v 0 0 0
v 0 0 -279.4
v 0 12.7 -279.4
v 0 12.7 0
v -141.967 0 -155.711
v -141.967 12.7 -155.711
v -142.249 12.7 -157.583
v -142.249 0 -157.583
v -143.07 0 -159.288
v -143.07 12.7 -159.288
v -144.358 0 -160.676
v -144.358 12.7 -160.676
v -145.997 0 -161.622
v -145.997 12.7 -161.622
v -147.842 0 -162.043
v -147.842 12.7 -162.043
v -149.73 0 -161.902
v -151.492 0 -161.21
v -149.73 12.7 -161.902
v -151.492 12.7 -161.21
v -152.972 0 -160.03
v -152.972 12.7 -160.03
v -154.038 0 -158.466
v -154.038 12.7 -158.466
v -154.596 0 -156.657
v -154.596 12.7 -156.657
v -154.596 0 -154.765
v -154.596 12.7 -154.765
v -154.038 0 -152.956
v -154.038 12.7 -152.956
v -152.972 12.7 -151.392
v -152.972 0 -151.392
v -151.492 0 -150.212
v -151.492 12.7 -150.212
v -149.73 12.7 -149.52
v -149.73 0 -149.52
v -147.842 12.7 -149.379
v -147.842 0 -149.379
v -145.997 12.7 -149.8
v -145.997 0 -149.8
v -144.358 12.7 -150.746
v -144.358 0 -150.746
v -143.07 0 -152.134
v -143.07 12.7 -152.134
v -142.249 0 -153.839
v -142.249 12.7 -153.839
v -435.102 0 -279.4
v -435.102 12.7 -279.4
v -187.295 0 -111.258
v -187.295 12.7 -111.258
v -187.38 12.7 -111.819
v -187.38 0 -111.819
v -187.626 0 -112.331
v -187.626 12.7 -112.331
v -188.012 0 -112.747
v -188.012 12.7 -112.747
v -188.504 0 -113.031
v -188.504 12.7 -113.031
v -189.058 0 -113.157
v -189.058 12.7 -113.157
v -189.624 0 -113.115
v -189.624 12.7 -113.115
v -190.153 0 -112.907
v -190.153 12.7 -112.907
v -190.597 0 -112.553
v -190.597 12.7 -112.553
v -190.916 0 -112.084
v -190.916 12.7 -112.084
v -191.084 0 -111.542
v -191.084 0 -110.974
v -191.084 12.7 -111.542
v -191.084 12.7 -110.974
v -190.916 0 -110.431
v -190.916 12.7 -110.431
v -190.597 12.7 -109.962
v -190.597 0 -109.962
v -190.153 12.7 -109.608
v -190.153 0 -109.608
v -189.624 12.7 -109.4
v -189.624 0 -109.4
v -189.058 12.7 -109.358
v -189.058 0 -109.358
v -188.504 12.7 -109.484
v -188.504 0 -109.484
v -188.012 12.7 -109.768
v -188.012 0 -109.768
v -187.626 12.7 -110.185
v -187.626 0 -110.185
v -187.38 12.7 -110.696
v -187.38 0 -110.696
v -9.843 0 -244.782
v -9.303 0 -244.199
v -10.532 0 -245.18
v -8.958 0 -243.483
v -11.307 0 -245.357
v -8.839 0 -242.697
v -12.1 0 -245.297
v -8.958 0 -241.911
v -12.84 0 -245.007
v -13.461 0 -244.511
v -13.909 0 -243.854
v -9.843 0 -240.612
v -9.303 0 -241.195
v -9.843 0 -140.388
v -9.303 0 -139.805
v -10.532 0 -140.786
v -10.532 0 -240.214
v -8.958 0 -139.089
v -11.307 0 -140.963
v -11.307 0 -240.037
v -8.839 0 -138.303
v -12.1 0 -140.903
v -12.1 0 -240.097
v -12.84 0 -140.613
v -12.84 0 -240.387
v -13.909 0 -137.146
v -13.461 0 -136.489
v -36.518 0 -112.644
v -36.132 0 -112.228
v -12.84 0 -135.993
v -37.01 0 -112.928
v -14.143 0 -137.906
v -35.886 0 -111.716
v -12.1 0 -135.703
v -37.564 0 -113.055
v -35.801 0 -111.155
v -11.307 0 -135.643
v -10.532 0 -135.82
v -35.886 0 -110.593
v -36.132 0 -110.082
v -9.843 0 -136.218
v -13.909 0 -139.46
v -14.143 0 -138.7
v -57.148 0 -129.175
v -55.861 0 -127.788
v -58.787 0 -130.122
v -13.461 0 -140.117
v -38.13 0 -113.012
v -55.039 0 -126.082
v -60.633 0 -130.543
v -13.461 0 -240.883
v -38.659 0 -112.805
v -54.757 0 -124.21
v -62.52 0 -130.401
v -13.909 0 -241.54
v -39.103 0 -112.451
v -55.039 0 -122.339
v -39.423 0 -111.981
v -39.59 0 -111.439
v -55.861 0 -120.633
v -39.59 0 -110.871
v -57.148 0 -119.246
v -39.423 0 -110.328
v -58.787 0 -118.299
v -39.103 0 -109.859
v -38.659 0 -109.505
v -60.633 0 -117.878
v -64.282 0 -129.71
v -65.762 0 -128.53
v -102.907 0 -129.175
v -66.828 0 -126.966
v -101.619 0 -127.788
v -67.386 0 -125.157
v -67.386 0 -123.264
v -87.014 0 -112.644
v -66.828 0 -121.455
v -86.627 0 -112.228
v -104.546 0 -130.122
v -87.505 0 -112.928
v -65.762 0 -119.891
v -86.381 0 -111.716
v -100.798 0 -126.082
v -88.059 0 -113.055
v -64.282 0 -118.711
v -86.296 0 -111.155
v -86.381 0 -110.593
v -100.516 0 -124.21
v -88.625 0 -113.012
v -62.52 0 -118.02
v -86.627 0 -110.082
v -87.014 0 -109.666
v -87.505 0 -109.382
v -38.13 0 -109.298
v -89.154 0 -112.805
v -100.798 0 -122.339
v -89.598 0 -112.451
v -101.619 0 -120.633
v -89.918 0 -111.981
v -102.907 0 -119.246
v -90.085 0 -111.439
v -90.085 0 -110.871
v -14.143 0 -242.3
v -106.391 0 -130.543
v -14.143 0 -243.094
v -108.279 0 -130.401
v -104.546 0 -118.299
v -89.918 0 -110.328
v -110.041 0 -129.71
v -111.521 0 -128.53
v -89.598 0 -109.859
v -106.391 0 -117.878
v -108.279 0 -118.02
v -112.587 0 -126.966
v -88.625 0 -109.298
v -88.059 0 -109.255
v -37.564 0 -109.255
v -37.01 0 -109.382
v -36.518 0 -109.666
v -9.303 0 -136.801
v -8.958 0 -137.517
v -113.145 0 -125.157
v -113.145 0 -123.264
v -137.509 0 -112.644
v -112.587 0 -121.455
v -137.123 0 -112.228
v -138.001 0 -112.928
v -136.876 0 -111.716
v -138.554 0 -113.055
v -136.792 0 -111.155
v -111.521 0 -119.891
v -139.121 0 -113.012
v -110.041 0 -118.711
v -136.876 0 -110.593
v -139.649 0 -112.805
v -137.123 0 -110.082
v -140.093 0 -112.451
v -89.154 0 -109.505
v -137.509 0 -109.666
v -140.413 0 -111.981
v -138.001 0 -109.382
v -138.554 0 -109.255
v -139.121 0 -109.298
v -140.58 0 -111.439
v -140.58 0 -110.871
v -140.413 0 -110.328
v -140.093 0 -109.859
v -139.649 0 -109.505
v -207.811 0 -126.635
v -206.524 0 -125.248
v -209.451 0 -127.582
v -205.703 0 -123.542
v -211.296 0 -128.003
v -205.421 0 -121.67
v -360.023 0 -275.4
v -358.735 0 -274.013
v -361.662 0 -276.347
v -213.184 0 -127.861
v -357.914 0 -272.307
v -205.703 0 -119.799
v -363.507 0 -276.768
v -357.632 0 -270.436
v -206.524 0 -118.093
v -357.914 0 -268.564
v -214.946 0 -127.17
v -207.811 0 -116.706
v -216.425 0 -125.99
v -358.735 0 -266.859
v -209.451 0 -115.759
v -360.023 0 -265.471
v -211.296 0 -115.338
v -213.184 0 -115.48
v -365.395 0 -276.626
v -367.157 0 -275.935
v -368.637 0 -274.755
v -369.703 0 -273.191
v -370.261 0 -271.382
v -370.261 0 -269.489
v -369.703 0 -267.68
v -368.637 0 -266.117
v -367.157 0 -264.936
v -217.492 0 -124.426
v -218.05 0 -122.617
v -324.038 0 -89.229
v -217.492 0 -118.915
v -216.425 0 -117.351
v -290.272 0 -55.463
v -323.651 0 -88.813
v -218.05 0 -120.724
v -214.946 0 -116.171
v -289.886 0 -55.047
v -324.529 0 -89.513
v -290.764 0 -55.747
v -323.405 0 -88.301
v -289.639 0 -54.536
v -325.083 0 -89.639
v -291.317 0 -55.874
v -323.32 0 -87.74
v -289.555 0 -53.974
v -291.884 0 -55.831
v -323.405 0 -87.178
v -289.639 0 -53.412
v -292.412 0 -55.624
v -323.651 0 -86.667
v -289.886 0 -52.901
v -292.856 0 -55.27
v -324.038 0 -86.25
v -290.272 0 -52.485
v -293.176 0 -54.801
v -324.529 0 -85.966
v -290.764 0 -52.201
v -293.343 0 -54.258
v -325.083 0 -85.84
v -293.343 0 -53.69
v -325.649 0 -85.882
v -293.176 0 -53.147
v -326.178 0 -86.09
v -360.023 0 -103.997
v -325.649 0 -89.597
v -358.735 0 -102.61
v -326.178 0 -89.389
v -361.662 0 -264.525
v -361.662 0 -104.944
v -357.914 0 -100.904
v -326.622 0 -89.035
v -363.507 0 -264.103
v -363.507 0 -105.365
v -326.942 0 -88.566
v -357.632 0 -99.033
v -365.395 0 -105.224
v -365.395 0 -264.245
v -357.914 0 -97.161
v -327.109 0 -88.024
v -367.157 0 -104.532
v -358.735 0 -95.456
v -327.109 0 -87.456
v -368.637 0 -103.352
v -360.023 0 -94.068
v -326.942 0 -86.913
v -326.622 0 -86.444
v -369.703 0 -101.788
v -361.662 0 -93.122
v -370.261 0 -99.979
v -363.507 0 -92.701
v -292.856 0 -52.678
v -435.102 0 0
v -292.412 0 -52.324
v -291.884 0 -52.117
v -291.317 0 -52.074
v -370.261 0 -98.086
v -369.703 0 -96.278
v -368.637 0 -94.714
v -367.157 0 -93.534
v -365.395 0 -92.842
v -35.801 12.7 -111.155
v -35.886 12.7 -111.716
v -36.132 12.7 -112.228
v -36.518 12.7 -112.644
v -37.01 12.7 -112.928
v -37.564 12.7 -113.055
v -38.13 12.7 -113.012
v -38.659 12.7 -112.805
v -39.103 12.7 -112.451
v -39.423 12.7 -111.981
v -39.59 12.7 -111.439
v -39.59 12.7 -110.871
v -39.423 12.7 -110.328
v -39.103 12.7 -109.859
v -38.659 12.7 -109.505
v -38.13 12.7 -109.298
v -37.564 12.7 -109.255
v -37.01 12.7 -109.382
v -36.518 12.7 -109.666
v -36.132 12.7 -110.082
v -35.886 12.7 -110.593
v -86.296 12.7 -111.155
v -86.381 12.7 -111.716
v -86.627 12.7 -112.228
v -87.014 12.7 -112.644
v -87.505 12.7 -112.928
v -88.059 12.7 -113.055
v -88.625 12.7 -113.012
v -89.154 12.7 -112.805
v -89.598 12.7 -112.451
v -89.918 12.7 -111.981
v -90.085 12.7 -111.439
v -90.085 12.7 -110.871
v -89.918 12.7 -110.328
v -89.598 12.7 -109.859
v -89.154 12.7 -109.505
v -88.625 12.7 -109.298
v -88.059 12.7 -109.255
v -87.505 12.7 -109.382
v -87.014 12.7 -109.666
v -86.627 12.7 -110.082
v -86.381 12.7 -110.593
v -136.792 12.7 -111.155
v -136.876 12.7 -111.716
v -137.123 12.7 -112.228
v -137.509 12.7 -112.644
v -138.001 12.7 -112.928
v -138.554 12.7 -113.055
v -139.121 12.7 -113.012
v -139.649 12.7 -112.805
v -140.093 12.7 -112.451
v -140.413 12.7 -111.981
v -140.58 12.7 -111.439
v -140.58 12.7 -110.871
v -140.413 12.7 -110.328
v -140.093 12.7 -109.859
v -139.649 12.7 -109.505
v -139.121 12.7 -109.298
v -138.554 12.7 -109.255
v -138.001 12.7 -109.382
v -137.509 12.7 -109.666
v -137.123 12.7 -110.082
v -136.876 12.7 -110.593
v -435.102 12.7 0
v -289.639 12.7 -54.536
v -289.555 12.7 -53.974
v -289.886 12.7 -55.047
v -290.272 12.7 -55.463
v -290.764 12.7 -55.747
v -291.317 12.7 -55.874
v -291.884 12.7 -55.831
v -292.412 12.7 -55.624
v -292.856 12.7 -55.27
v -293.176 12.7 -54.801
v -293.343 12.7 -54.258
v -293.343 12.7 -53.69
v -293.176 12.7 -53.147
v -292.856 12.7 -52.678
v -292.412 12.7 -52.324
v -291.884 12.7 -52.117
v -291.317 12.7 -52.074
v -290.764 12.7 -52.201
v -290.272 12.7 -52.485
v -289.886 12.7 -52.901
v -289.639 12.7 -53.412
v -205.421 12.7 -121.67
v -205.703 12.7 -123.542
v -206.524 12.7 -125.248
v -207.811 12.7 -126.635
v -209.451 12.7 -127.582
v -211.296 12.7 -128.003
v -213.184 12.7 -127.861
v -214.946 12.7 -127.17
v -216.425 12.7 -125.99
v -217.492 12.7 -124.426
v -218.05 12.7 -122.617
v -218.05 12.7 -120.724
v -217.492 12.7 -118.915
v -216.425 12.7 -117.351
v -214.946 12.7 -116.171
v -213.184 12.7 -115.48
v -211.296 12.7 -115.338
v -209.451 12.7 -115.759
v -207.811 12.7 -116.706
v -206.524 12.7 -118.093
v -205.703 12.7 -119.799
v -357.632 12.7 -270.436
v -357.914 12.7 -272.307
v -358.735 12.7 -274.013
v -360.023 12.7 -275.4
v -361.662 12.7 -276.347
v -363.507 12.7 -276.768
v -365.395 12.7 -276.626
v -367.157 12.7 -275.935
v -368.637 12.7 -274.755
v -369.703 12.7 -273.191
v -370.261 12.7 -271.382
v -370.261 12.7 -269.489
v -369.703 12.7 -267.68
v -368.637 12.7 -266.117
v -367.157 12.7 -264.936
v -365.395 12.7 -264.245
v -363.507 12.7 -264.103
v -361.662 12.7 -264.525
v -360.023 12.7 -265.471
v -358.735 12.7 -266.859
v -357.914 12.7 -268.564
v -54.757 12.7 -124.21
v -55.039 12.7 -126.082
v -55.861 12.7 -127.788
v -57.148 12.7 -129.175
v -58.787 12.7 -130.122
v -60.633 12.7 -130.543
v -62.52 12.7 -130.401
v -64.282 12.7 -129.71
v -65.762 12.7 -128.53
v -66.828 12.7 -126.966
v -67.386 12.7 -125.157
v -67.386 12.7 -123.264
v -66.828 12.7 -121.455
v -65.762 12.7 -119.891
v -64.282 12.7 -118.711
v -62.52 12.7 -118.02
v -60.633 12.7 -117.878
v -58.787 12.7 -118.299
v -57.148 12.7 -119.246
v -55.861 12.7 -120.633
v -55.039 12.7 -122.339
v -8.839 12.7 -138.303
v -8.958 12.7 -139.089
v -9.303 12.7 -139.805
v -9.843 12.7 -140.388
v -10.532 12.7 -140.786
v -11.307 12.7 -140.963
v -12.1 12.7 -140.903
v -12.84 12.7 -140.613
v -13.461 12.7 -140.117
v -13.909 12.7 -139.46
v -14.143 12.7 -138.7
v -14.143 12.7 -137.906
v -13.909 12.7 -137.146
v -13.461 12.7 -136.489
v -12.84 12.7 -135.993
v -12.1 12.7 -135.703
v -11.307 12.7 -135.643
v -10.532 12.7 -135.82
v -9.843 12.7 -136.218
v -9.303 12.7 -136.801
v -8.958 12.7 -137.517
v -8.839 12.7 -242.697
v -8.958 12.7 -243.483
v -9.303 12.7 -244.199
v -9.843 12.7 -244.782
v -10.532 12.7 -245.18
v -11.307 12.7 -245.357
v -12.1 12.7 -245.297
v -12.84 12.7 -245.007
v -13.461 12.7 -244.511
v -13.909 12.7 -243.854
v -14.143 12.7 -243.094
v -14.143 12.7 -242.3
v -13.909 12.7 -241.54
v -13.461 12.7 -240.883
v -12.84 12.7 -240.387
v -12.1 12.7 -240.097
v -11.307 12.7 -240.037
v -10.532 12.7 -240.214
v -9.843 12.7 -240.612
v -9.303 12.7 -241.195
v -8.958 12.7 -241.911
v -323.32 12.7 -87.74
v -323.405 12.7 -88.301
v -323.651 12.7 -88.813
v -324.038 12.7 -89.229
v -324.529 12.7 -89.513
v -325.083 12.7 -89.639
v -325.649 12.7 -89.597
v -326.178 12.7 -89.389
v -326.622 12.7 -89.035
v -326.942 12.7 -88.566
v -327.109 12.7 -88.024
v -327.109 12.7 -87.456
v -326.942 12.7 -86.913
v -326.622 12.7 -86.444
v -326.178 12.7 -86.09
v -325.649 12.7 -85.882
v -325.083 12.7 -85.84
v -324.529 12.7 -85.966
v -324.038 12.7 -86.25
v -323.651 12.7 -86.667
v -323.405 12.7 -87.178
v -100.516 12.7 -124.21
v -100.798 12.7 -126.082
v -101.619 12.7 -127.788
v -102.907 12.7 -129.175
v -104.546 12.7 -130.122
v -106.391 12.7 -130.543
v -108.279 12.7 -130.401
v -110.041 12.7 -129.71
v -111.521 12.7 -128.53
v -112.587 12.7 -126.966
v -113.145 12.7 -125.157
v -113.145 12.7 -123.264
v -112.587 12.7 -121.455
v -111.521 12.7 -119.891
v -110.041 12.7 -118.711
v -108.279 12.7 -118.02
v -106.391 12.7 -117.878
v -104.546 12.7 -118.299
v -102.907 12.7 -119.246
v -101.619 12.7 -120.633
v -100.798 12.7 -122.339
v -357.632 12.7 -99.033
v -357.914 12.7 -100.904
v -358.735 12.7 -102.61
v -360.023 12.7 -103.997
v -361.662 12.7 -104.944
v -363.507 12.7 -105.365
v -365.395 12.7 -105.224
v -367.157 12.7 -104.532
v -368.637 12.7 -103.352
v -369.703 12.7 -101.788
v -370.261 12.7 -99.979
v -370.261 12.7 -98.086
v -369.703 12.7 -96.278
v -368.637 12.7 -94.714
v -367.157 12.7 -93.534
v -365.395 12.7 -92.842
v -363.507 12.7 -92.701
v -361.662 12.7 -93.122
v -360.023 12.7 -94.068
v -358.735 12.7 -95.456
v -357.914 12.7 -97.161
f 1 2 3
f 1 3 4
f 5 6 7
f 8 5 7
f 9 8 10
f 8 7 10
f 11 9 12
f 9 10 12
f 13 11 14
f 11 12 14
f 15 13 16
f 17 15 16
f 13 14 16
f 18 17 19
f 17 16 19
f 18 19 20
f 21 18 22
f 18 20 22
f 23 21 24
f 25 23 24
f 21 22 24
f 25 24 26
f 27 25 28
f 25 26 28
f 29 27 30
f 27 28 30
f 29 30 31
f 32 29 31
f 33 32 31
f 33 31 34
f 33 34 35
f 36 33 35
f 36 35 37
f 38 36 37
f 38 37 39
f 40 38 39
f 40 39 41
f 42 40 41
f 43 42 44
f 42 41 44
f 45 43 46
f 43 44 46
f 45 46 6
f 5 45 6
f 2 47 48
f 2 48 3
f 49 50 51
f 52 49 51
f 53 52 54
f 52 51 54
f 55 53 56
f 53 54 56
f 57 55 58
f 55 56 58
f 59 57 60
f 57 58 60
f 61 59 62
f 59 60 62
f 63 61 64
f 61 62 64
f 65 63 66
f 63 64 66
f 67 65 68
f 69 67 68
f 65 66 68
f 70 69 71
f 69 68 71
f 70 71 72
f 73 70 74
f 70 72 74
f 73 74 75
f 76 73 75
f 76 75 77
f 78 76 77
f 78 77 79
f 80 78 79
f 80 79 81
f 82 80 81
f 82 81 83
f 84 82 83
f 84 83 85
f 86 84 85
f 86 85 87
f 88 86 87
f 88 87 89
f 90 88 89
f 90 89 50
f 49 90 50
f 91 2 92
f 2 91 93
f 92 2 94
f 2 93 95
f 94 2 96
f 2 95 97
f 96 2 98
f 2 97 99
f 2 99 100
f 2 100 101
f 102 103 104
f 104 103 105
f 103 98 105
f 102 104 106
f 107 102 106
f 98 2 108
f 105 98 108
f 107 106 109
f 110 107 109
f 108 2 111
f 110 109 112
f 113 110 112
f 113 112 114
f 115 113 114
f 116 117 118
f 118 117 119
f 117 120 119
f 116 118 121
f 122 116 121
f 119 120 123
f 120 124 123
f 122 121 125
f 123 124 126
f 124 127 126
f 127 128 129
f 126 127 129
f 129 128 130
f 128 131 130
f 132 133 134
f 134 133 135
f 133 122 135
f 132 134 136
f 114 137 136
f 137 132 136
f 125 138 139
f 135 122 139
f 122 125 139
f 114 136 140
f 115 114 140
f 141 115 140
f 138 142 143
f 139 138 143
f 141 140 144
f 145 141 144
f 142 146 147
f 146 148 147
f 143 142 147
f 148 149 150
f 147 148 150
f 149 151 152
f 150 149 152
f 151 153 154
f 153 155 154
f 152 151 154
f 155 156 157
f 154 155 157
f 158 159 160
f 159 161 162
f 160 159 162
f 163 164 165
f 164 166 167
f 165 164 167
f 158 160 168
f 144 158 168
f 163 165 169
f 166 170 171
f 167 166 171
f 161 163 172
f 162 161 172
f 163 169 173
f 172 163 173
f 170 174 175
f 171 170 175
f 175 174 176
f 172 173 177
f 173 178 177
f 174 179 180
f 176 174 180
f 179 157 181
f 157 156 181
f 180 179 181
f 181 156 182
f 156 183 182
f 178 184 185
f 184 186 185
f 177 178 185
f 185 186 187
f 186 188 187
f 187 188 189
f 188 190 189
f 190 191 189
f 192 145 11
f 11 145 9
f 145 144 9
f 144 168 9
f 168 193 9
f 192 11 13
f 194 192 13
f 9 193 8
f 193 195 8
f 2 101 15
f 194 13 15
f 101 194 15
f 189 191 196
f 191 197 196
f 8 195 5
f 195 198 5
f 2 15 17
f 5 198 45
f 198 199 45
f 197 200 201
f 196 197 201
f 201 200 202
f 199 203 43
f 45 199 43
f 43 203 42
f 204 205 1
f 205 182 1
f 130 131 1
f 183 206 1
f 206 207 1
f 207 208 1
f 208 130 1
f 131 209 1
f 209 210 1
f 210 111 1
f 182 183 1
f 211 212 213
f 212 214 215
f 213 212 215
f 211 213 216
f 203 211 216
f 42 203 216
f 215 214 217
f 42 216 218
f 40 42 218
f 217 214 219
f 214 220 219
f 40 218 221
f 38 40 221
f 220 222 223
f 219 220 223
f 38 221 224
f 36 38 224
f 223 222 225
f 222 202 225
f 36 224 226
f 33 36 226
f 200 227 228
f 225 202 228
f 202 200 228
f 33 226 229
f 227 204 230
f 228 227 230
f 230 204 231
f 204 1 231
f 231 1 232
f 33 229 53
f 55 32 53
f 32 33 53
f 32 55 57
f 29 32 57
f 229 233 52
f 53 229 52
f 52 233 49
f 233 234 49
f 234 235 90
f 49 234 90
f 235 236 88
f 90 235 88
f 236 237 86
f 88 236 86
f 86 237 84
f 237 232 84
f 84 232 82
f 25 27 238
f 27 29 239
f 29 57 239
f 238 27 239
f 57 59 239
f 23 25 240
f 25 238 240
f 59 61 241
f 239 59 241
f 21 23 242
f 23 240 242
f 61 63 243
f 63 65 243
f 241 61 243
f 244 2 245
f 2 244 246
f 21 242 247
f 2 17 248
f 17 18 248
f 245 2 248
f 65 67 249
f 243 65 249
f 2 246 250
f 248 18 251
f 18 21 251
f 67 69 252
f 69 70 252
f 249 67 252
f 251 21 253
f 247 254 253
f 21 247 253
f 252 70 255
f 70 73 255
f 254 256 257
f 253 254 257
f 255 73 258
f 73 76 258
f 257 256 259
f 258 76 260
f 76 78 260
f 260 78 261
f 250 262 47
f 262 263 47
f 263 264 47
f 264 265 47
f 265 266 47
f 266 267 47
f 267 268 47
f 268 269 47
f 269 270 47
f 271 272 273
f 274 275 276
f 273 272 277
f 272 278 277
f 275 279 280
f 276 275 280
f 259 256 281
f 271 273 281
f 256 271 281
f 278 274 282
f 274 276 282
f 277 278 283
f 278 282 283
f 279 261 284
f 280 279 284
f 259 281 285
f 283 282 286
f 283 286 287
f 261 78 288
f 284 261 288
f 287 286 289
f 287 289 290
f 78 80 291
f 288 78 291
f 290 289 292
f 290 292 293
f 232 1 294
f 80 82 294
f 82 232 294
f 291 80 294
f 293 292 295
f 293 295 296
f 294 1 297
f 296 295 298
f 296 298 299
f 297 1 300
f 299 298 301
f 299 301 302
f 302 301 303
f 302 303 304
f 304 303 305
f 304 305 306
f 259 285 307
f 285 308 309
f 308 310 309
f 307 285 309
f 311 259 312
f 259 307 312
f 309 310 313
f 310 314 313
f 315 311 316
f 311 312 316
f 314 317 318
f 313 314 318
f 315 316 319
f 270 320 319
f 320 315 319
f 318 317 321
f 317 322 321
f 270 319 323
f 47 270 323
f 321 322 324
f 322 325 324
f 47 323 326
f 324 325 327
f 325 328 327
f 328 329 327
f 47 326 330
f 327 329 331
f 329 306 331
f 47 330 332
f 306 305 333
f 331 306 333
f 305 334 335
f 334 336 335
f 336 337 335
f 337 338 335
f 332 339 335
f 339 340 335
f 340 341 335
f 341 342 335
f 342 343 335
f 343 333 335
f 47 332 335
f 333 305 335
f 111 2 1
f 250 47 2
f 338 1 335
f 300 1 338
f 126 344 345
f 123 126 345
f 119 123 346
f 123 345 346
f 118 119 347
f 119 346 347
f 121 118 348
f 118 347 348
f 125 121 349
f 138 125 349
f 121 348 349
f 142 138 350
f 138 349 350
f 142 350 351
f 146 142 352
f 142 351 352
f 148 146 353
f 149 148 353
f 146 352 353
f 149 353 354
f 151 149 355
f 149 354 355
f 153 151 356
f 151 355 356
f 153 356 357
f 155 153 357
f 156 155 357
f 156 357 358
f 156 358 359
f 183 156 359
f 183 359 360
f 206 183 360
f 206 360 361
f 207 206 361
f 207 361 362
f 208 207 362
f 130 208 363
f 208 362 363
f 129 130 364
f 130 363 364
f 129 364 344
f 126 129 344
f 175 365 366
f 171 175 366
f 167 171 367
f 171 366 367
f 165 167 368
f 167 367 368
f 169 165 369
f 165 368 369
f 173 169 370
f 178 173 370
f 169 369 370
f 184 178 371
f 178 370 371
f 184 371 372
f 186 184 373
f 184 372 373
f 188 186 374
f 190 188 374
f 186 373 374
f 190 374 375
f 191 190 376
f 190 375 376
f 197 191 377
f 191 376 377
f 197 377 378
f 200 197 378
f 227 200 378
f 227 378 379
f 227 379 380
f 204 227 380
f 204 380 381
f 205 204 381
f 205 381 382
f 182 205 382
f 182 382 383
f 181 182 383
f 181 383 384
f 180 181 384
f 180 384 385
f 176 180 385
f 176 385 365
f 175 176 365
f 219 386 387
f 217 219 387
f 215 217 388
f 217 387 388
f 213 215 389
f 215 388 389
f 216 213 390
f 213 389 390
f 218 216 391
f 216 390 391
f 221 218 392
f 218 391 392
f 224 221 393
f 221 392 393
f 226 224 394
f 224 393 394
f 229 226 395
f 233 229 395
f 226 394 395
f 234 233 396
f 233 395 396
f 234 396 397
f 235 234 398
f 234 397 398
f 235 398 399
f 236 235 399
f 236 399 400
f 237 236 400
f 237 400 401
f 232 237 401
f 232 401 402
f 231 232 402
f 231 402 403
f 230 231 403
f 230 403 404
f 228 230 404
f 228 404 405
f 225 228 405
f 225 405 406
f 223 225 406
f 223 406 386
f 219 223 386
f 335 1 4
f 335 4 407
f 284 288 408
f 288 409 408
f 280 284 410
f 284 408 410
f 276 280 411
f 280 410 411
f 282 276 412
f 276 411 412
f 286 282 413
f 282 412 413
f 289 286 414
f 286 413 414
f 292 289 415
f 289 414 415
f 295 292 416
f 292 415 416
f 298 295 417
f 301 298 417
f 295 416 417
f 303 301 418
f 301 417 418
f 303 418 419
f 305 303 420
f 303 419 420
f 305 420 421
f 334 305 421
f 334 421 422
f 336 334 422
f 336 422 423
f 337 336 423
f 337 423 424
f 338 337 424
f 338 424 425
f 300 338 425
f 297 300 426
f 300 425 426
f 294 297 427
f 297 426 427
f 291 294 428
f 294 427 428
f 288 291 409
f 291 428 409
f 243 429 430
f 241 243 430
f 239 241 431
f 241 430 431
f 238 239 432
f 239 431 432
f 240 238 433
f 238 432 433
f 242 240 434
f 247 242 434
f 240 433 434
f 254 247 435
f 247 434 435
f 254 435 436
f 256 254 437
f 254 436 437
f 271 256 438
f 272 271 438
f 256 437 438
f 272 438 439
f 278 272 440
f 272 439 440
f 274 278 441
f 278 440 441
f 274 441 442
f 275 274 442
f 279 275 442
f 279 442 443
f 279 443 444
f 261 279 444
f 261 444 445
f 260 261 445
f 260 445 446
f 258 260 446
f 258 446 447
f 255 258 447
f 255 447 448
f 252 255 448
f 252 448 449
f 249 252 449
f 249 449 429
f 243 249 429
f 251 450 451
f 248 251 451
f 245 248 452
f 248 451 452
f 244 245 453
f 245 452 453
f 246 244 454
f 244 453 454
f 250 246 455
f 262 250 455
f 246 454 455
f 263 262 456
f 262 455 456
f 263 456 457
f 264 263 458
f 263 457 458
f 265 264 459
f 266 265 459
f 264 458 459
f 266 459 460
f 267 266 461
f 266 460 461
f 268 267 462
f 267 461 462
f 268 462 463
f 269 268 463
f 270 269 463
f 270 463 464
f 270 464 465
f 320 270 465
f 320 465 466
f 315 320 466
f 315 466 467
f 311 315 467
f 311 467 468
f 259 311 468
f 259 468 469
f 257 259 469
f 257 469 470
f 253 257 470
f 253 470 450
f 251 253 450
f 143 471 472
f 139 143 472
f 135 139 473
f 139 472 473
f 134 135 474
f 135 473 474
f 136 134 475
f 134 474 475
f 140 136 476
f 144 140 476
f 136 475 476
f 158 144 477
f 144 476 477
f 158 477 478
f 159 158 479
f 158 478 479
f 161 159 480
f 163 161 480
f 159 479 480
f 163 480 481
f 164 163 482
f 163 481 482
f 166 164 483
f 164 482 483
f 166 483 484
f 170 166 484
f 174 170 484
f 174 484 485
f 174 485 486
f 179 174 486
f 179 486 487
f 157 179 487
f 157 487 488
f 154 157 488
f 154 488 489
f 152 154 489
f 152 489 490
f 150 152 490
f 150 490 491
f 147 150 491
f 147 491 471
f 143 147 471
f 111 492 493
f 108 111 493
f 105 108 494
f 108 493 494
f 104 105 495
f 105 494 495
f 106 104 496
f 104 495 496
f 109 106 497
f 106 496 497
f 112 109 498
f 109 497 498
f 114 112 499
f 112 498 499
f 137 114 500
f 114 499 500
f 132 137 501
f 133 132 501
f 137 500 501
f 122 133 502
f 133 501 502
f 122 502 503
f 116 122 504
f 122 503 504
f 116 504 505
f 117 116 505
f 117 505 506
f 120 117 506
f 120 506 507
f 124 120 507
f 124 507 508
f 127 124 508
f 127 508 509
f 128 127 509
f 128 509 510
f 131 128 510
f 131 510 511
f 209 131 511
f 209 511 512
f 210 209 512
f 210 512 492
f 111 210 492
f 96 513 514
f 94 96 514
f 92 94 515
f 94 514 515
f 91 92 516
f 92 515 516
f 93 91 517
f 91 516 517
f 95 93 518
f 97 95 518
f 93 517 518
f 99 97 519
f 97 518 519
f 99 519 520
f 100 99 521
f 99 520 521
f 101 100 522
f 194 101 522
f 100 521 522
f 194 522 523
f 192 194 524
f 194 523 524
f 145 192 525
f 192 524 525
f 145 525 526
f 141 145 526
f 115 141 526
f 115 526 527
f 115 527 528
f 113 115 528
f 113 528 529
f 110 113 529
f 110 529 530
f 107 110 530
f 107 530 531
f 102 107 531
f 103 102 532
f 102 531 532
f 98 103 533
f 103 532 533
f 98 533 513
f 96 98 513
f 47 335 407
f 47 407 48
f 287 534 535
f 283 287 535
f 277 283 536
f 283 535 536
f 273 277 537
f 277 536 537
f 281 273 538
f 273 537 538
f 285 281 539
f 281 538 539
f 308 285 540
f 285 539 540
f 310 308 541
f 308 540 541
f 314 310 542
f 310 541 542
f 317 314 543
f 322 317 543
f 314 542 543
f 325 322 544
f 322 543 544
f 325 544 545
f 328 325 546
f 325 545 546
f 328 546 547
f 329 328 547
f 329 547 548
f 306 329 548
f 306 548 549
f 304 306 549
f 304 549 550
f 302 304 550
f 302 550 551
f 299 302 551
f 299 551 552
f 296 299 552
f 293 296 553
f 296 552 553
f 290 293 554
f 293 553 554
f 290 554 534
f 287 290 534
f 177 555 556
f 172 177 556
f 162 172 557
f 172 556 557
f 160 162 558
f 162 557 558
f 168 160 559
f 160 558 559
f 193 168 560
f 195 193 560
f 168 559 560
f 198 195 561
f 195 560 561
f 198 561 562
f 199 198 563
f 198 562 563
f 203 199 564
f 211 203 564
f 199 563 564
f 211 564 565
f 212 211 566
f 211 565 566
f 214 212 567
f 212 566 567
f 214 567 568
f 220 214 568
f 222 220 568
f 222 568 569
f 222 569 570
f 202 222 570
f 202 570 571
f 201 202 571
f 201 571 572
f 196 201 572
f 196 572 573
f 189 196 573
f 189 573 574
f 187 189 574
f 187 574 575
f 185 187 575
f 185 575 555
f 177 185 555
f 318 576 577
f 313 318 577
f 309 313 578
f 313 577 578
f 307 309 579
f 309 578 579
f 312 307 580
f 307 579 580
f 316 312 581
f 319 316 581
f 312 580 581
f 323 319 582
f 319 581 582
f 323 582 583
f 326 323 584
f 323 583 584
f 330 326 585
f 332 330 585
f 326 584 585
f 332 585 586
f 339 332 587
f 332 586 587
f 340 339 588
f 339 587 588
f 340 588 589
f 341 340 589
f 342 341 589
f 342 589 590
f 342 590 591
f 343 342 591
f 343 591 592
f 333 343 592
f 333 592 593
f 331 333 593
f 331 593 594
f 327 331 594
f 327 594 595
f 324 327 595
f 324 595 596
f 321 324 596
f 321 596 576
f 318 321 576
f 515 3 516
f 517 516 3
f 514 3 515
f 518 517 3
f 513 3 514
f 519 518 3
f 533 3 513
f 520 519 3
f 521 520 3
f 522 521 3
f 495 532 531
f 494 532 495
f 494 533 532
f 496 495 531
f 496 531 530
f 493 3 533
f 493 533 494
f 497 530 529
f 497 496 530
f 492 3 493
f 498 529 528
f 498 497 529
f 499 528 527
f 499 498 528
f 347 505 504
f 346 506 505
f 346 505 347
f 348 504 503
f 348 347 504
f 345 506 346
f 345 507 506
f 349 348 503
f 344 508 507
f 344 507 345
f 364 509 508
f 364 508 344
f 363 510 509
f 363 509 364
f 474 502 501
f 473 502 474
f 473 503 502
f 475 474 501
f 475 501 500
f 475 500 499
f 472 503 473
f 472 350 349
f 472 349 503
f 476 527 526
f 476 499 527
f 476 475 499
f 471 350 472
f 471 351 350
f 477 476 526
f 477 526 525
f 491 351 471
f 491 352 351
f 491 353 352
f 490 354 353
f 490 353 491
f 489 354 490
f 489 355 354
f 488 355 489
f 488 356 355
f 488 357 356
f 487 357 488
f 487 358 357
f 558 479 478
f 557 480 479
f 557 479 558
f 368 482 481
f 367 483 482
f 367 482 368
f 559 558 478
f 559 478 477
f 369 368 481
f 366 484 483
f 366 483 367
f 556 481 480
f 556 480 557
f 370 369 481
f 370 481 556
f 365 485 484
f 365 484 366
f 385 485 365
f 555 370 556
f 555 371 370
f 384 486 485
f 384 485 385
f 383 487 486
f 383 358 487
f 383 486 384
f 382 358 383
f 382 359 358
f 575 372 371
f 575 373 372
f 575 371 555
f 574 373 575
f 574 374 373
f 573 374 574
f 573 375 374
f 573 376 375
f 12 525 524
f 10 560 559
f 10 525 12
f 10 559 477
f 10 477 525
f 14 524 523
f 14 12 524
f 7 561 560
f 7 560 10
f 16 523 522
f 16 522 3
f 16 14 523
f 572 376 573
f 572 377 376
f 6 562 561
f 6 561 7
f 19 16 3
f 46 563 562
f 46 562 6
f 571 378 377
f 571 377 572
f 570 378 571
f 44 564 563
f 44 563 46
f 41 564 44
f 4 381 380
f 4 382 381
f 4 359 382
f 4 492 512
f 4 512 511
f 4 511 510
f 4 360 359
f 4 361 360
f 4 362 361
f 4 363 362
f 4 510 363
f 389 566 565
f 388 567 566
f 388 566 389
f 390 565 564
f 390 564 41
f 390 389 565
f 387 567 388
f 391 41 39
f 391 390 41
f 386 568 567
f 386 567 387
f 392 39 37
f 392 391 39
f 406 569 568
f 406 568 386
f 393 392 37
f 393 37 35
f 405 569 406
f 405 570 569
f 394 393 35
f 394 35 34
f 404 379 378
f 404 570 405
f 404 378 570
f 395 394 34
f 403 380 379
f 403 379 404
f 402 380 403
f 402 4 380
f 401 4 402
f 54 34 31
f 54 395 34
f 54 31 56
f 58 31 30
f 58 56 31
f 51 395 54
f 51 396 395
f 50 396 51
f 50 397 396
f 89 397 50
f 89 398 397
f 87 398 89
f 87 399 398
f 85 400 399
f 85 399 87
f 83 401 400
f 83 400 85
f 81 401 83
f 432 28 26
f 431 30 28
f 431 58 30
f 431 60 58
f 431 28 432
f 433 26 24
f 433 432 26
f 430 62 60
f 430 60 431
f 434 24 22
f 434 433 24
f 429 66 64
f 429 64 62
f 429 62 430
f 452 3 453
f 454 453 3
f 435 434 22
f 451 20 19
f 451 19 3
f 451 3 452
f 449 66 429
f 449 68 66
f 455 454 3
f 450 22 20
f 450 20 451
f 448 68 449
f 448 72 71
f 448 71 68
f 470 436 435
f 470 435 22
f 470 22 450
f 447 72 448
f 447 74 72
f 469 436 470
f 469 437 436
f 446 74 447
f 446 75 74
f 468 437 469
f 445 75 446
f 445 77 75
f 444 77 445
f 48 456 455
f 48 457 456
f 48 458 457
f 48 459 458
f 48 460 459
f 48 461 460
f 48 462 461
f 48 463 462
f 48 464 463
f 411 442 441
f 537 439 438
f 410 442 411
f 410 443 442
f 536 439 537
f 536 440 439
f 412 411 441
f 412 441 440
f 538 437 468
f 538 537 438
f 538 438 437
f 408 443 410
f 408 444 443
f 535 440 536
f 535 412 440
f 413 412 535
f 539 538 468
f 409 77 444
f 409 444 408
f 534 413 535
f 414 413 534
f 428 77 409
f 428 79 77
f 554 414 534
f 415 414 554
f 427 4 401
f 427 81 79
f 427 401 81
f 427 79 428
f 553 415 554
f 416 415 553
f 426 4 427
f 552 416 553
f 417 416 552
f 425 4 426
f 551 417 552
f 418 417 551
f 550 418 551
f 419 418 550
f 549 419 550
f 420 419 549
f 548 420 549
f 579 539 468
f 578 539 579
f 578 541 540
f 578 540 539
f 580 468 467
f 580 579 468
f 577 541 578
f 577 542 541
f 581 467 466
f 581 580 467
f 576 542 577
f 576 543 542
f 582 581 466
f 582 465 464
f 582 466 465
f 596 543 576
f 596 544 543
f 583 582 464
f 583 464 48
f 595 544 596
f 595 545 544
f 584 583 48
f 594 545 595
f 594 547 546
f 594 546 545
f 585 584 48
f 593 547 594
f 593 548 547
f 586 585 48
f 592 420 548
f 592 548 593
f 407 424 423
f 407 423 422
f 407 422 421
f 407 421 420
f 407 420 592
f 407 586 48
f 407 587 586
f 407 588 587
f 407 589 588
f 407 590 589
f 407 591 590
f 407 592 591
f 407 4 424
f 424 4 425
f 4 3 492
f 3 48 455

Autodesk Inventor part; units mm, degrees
ref_plane "YZ Plane" through (0, 0, 0) normal (1, 0, 0) x (0, 1, 0)
ref_plane "XZ Plane" through (0, 0, 0) normal (0, 1, 0) x (-1, 0, 0)
ref_plane "XY Plane" through (0, 0, 0) normal (0, 0, 1) x (1, 0, 0)
sketch "Sketch1" plane through (0, 0, 0) normal (0, 1, 0) x (-1, 0, 0)
  line L0 (0, 0) -> (435.102, 0)
  line L1 (435.102, 0) -> (435.102, -279.4)
  line L2 (435.102, -279.4) -> (0, -279.4)
  line L3 (0, -279.4) -> (0, 0)
  dimension "d0" = 435.102
  dimension "d1" = 279.4
extrude "Extrusion1" add sketch "Sketch1" along normal blind 12.7
sketch "Sketch2" plane through (0, 12.7, 0) normal (0, 1, 0) x (1, 0, 0)
  line L0 (0, 0) -> (0, 279.4) projected
  line L1 (-435.102, 279.4) -> (-435.102, 0) projected
  line L2 (-435.102, 0) -> (0, 0) projected
  line L3 (-190.5, 139.7) -> (0, 139.7)
  line L4 (0, 279.4) -> (-435.102, 279.4) projected
  line L5 (0, 279.4) -> (0, 139.7)
  line L6 (0, 0) -> (0, 139.7)
  circle A0 centre (-11.5062, 138.303) radius 2.667
  circle A1 centre (-11.5062, 242.697) radius 2.667
  dimension "d8" = 5.334
  dimension "d10" = 5.334
  dimension "d20" = 11.5062
  dimension "d21" = 11.5062
extrude "Extrusion2" cut sketch "Sketch2" against normal blind 12.7 contours A0 L3 | L3 A0 | A1
thread "Thread1" size "12-24 UNC" class "2B" standard "ANSI Unified Screw Threads" full length
thread "Thread2" size "12-24 UNC" class "2B" standard "ANSI Unified Screw Threads" full length
sketch "Sketch9" plane through (0, 12.7, 0) normal (0, 1, 0) x (1, 0, 0)
  line L0 (-435.102, 279.4) -> (-435.102, 0) projected
  line L1 (0, 279.4) -> (-435.102, 279.4) projected
  line L2 (-228.6, 279.4) -> (-114.6048, 279.4)
  circle A0 centre (-228.6, 165.4048) radius 1.905
  circle A1 centre (-276.352, 165.4048) radius 1.905
  point P0 (0, 0)
  dimension "d59" = 3.81
  dimension "d61" = 113.9952
  dimension "d63" = 3.81
  dimension "d64" = 47.752
extrude "Extrusion6" cut sketch "Sketch9" against normal blind 25.4
sketch "Sketch10" plane through (0, 12.7, 0) normal (0, 1, 0) x (1, 0, 0)
  circle A0 centre (-73.9111, 98.5347) radius 1.9812 projected
  line L0 (-73.9111, 98.5347) -> (-179.5995, 98.5347)
  circle A1 centre (-179.5995, 98.5347) radius 1.905
  point P0 (0, 0)
  dimension "d67" = 3.81
sketch "Sketch11" plane through (0, 12.7, 0) normal (0, 1, 0) x (1, 0, 0)
  circle A0 centre (-138.6966, 96.5535) radius 1.9812 projected
  circle A1 centre (-138.6966, 96.5535) radius 1.9812
  circle A2 centre (-73.9111, 98.5347) radius 1.9812 projected
  circle A3 centre (-73.9111, 98.5347) radius 1.9812
  circle A4 centre (-138.6966, 96.5535) radius 1.9812 projected
  circle A5 centre (-189.4966, 96.5535) radius 1.905
  circle A6 centre (-138.6966, 274.9457) radius 1.905
  circle A7 centre (-189.4966, 276.8507) radius 1.905
  line L0 (-233.5122, 296.5851) -> (-202.1873, 265.2602)
  line L1 (-198.1568, 261.2297) -> (-195.5777, 258.6506)
  line L2 (-147.3568, 261.2297) -> (-144.7777, 258.6506)
  line L3 (-182.7122, 296.5851) -> (-151.3873, 265.2602)
  line L4 (-147.3154, 108.6372) -> (-144.7363, 111.2163)
  line L5 (-151.3873, 104.6481) -> (-182.7122, 73.3232)
  line L6 (-195.5777, 111.2577) -> (-198.1568, 108.6786)
  line L7 (-202.1873, 104.6481) -> (-233.5122, 73.3232)
  circle A8 centre (-228.6, 165.4048) radius 1.905 projected
  circle A9 centre (-276.352, 165.4048) radius 1.905 projected
  circle A10 centre (-11.5062, 138.303) radius 2.667 projected
  circle A11 centre (-11.5062, 242.697) radius 2.667 projected
  line L8 (-435.102, 0) -> (0, 0) projected
  line L9 (0, 0) -> (0, 279.4) projected
  line L10 (0, 279.4) -> (-435.102, 279.4) projected
  line L11 (-435.102, 279.4) -> (-435.102, 0) projected
  line L12 (-189.2001, 247.8995) -> (-37.7952, 247.8995)
  line L13 (-189.2001, 133.1005) -> (-39.5732, 133.1005)
  line L14 (-138.6966, 133.1005) -> (-138.6966, 122.2293)
  line L15 (-195.5777, 122.2293) -> (-196.8672, 259.9401)
  line L16 (-144.7777, 258.6506) -> (-147.3147, 111.2577)
  line L17 (-147.3147, 111.2577) -> (-195.5777, 111.2577)
  line L18 (-195.5777, 111.2577) -> (-195.5777, 122.2293)
  line L19 (-138.6966, 122.2293) -> (-195.5777, 122.2293)
  line L20 (-138.6966, 122.2293) -> (-138.6966, 111.1549)
  circle A12 centre (-138.6966, 111.1549) radius 1.905
  circle A13 centre (-189.2001, 111.2577) radius 1.905
  circle A14 centre (-138.6966, 96.5535) radius 1.9812
  circle A15 centre (-189.4966, 96.5535) radius 1.905
  circle A16 centre (-111.9102, 274.9457) radius 1.9812
  circle A17 centre (-138.6966, 274.9457) radius 1.905
  circle A18 centre (-189.4966, 276.8507) radius 1.905
  circle A19 centre (-228.6, 165.4048) radius 1.905 projected
  circle A20 centre (-228.6, 165.4048) radius 1.905
  circle A21 centre (-276.352, 165.4048) radius 1.905 projected
  circle A22 centre (-276.352, 165.4048) radius 1.905
  dimension "d72" = 3.81
  dimension "d77" = 3.81
  dimension "d78" = 3.81
  dimension "d127" = 21.8842
  dimension "d128" = 10.8712
  dimension "d129" = 11.0744
  dimension "d130" = 3.81
  dimension "d131" = 3.81
extrude "Extrusion7" add sketch "Sketch10" against normal blind 12.7 contours A0
extrude "Extrusion8" cut sketch "Sketch11" against normal blind 12.7 contours A5
sketch "Sketch12" plane through (0, 12.7, 0) normal (0, 1, 0) x (1, 0, 0)
  circle A0 centre (-111.9102, 274.9457) radius 1.9812 projected
  circle A1 centre (-111.9102, 274.9457) radius 1.9812
  circle A2 centre (-50.2837, 276.9269) radius 1.9812 projected
  circle A3 centre (-50.2837, 276.9269) radius 1.9812
  point P0 (0, 0)
extrude "Extrusion9" add sketch "Sketch12" against normal blind 12.7
sketch "Sketch13" plane through (0, 12.7, 0) normal (0, 1, 0) x (1, 0, 0)
  circle A0 centre (-189.4966, 96.5535) radius 1.905 projected
  circle A1 centre (-138.6966, 96.5535) radius 1.9812 projected
  line L0 (-435.102, 279.4) -> (0, 279.4) projected
  circle A2 centre (-138.6966, 273.3548) radius 1.905
  circle A3 centre (-189.4966, 273.3548) radius 1.905
  point P0 (0, 0)
  dimension "d79" = 3.81
  dimension "d80" = 3.81
extrude "Extrusion10" cut sketch "Sketch13" against normal blind 12.7 contours A2 | A3
sketch "Sketch15" plane through (0, 0, 0) normal (0, -1, 0) x (1, 0, 0)
  circle A0 centre (-189.4966, -273.3548) radius 1.905 projected
  circle A1 centre (-189.4966, -273.3548) radius 1.905
  circle A2 centre (-138.6966, -273.3548) radius 1.905 projected
  circle A3 centre (-138.6966, -273.3548) radius 1.905
  point P0 (0, 0)
extrude "Extrusion12" add sketch "Sketch15" against normal blind 12.7
sketch "Sketch16" plane through (0, 12.7, 0) normal (0, 1, 0) x (1, 0, 0)
  circle A0 centre (-301.5668, 273.3548) radius 1.905
  circle A1 centre (-253.8148, 273.3548) radius 1.905
  point P0 (0, 0)
  dimension "d89" = 3.81
  dimension "d90" = 3.81
  dimension "d91" = 47.752
extrude "Extrusion13" cut sketch "Sketch16" against normal blind 12.7
sketch "Sketch17" plane through (0, 12.7, 0) normal (0, 1, 0) x (1, 0, 0)
  circle A0 centre (-228.6, 165.4048) radius 1.905 projected
  circle A1 centre (-228.6, 165.4048) radius 1.905
  circle A2 centre (-276.352, 165.4048) radius 1.905 projected
  circle A3 centre (-276.352, 165.4048) radius 1.905
  point P0 (0, 0)
extrude "Extrusion14" add sketch "Sketch17" against normal blind 12.7
sketch "Sketch18" plane through (0, 12.7, 0) normal (0, 1, 0) x (1, 0, 0)
  circle A0 centre (-154.6206, 259.3143) radius 6.35
  circle A1 centre (-199.1169, 258.3518) radius 6.35
  circle A2 centre (-211.7706, 121.6705) radius 6.35
  circle A3 centre (-148.3169, 155.711) radius 6.35
  circle A4 centre (-363.982, 103.99) radius 6.35
  circle A5 centre (-363.982, 266.5172) radius 6.35
  line L0 (-435.102, 279.4) -> (-435.102, 0) projected
  line L1 (-182.8964, 164.601) -> (-33.2695, 164.601) projected
  line L2 (-192.48, 267.7748) -> (-192.48, 273.9984) projected
  point P0 (0, 0)
  dimension "d102" = 12.7
  dimension "d103" = 12.7
  dimension "d105" = 12.7
  dimension "d106" = 12.7
  dimension "d107" = 12.7
  dimension "d109" = 12.7
  dimension "d110" = 71.12
  dimension "d111" = 71.12
  dimension "d124" = 8.89
  dimension "d126" = 6.6369
extrude "Extrusion15" cut sketch "Sketch18" against normal blind 12.7 contours A0 | A1 | A2 | A3
sketch "Sketch19" plane through (0, 12.7, 0) normal (0, 1, 0) x (1, 0, 0)
  circle A0 centre (-363.982, 270.4356) radius 6.35
  line L0 (-435.102, 279.4) -> (-435.102, 0) projected
  circle A1 centre (-363.982, 99.0328) radius 6.35
  circle A2 centre (-148.3169, 155.711) radius 6.35 projected
  line L1 (-182.8964, 164.601) -> (-33.2695, 164.601) projected
  point P0 (0, 0)
  dimension "d114" = 12.7
  dimension "d116" = 71.12
  dimension "d117" = 12.7
  dimension "d119" = 71.12
extrude "Extrusion16" cut sketch "Sketch19" against normal blind 12.7 contours A0 | A1
sketch "Sketch21" plane through (0, 12.7, 0) normal (0, 1, 0) x (1, 0, 0)
  circle A0 centre (-138.6966, 96.5535) radius 1.9812
  circle A1 centre (-138.6966, 96.5535) radius 1.9812
  circle A2 centre (-73.9111, 98.5347) radius 1.9812
  circle A3 centre (-73.9111, 98.5347) radius 1.9812
  circle A4 centre (-138.6966, 96.5535) radius 1.9812
  circle A5 centre (-189.4966, 96.5535) radius 1.905
  circle A6 centre (-138.6966, 274.9457) radius 1.905
  circle A7 centre (-189.4966, 276.8507) radius 1.905
  line L0 (-198.1568, 261.2297) -> (-195.5777, 258.6506)
  line L1 (-147.3568, 261.2297) -> (-144.7777, 258.6506)
  line L2 (-147.3154, 108.6372) -> (-144.7363, 111.2163)
  line L3 (-151.3873, 104.6481) -> (-182.7122, 73.3232)
  line L4 (-195.5777, 111.2577) -> (-198.1568, 108.6786)
  line L5 (-202.1873, 104.6481) -> (-233.5122, 73.3232)
  circle A8 centre (-228.6, 273.3548) radius 1.905
  circle A9 centre (-276.352, 273.3548) radius 1.905
  circle A10 centre (-111.9102, 274.9457) radius 1.9812
  circle A11 centre (-138.6966, 96.5535) radius 1.9812
  circle A12 centre (-50.2837, 276.9269) radius 1.9812
  circle A13 centre (-11.5062, 138.303) radius 2.667
  circle A14 centre (-11.5062, 242.697) radius 2.667
  line L6 (-189.2001, 247.8995) -> (-37.7952, 247.8995)
  line L7 (-189.2001, 133.1005) -> (-39.5732, 133.1005)
  line L8 (-138.6966, 133.1005) -> (-138.6966, 122.2293)
  line L9 (-195.5777, 122.2293) -> (-196.8672, 259.9401)
  line L10 (-144.7777, 258.6506) -> (-147.3147, 111.2577)
  line L11 (-147.3147, 111.2577) -> (-195.5777, 111.2577)
  line L12 (-195.5777, 111.2577) -> (-195.5777, 122.2293)
  line L13 (-138.6966, 122.2293) -> (-195.5777, 122.2293)
  line L14 (-138.6966, 122.2293) -> (-138.6966, 111.1549)
  circle A15 centre (-138.6966, 111.1549) radius 1.905
  circle A16 centre (-189.2001, 111.2577) radius 1.905
  point P0 (0, 0)
  point P1 (-202.1873, 265.2602)
  point P2 (-151.3873, 265.2602)
  dimension "d132" = 3.81
  dimension "d133" = 3.81
  dimension "d134" = 3.81
  dimension "d135" = 21.8842
  dimension "d136" = 10.8712
  dimension "d137" = 11.0744
  dimension "d138" = 3.81
  dimension "d139" = 3.81
extrude "Extrusion17" cut sketch "Sketch21" against normal blind 12.7 contours A15 | A16 L11 | L11 A16
sketch "Sketch22" plane through (0, 12.7, 0) normal (0, 1, 0) x (1, 0, 0)
  circle A0 centre (-138.6966, 289.5514) radius 1.905 projected
  circle A1 centre (-138.6966, 289.5514) radius 1.905
  circle A2 centre (-189.4966, 291.4564) radius 1.905 projected
  circle A3 centre (-189.4966, 291.4564) radius 1.905
  circle A4 centre (-253.8148, 273.3548) radius 1.905 projected
  circle A5 centre (-253.8148, 273.3548) radius 1.905
  circle A6 centre (-301.5668, 273.3548) radius 1.905 projected
  circle A7 centre (-301.5668, 273.3548) radius 1.905
  circle A8 centre (-189.4966, 96.5535) radius 1.905 projected
  circle A9 centre (-189.4966, 96.5535) radius 1.905
  circle A10 centre (-138.6966, 96.5535) radius 1.9812 projected
  circle A11 centre (-138.6966, 96.5535) radius 1.9812
  point P0 (0, 0)
extrude "Extrusion18" add sketch "Sketch22" against normal blind 12.7
sketch "Sketch24" plane through (-189.4966, 12.7, -291.4564) normal (0, 1, 0) x (1, 0, 0)
  circle A0 centre (50.8, -1.905) radius 1.905 projected
  circle A1 centre (50.8, -1.905) radius 1.905
  circle A2 centre (0, 0) radius 1.905 projected
  circle A3 centre (0, 0) radius 1.905
  point P0 (189.4966, -291.4564)
extrude "Extrusion19" cut sketch "Sketch24" against normal blind 12.7
sketch "Sketch25" plane through (0, 12.7, 0) normal (0, 1, 0) x (1, 0, 0)
  circle A0 centre (-325.2254, 87.7397) radius 1.905
  circle A1 centre (-291.4597, 53.974) radius 1.905
  line L0 (-325.2254, 87.7397) -> (-291.4597, 53.974)
  point P0 (0, 0)
  dimension "d147" = 3.81
  dimension "d148" = 3.81
  dimension "d152" = 47.752
extrude "Extrusion20" cut sketch "Sketch25" against normal blind 12.7
sketch "Sketch26" plane through (0, 12.7, 0) normal (0, 1, 0) x (1, 0, 0)
  circle A0 centre (-88.2014, 111.1549) radius 1.905
  circle A1 centre (-138.6966, 111.1549) radius 1.905 projected
  circle A2 centre (-37.7062, 111.1549) radius 1.905
  point P0 (0, 0)
  dimension "d155" = 3.81
  dimension "d156" = 50.4952
  dimension "d157" = 3.81
  dimension "d158" = 50.4952
extrude "Extrusion21" cut sketch "Sketch26" against normal blind 12.7 contours A0 | A2
sketch "Sketch27" plane through (0, 12.7, 0) normal (0, 1, 0) x (1, 0, 0)
  circle A0 centre (-106.8659, 124.2105) radius 6.35
  circle A1 centre (-148.3169, 155.711) radius 6.35 projected
  circle A2 centre (-61.1072, 124.2105) radius 6.35
  point P0 (0, 0)
  dimension "d162" = 12.7
  dimension "d163" = 12.7
extrude "Extrusion22" cut sketch "Sketch27" against normal blind 12.7 contours A0 | A2
sketch "Sketch29" plane through (0, 12.7, 0) normal (0, 1, 0) x (1, 0, 0)
  circle A0 centre (-199.1169, 258.3518) radius 6.35 projected
  circle A1 centre (-199.1169, 258.3518) radius 6.35
  circle A2 centre (-154.6206, 259.3143) radius 6.35 projected
  circle A3 centre (-154.6206, 259.3143) radius 6.35
  point P0 (0, 0)
extrude "Extrusion23" add sketch "Sketch29" against normal blind 12.7
properties part number "board_15x15x0.5"
